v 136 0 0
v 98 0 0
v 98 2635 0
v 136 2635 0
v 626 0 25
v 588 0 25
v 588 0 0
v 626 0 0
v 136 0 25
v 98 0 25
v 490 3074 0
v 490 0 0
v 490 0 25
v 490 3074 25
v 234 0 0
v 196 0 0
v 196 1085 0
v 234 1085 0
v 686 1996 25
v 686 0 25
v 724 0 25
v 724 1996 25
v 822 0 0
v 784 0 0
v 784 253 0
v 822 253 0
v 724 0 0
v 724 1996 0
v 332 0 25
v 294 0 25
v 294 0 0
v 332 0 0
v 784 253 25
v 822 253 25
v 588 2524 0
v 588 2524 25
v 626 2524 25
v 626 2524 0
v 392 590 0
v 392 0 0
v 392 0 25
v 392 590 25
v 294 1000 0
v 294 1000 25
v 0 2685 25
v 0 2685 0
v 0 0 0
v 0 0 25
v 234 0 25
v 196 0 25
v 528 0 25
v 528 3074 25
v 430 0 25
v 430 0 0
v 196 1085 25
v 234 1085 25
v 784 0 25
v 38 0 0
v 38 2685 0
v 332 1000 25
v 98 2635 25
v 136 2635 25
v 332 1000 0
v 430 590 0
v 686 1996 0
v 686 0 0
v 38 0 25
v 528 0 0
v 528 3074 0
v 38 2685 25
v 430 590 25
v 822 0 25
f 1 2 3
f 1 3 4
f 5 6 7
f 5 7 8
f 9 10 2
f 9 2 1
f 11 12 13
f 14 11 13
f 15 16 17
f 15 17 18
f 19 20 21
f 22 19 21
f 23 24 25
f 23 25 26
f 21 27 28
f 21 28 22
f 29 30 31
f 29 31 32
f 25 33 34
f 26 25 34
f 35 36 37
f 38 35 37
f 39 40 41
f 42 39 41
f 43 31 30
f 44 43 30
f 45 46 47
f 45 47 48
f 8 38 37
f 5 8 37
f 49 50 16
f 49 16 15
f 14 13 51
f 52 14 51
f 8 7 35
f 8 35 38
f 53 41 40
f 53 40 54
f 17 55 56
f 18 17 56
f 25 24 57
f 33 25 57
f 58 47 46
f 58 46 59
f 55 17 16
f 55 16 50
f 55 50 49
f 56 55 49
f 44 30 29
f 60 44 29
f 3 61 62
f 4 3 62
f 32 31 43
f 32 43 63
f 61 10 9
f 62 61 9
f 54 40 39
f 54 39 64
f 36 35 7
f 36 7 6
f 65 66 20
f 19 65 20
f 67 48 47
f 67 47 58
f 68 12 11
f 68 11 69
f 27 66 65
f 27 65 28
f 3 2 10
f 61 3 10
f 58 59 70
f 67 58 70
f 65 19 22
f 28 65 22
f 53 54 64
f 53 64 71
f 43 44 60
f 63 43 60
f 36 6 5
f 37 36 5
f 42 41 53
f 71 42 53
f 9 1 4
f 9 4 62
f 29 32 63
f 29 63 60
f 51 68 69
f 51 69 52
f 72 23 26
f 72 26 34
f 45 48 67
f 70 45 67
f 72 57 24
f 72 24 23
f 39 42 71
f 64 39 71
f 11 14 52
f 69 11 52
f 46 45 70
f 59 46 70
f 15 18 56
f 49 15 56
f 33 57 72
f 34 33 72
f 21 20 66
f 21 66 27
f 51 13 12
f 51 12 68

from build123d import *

# Parameters (mm, degrees)
F0_W     = 38
F0_H     = 25
F1_DEPTH = 2685
F2_DEPTH = 2635
F3_DEPTH = 1085
F4_DEPTH = 1000
F5_DEPTH = 590
F6_DEPTH = 3074
F7_DEPTH = 2524
F8_DEPTH = 1996
F9_DEPTH = 253


with BuildPart() as f1:
    # F0 (on Front) → F1 (new body)
    with BuildSketch(Plane.XZ):
        with Locations((19, 12.5)):
            Rectangle(F0_W, F0_H)
    extrude(amount=-F1_DEPTH)


with BuildPart() as f2:
    # F0 (on Front) → F2 (new body)
    with BuildSketch(Plane.XZ):
        with Locations((117, 12.5)):
            Rectangle(F0_W, F0_H)
    extrude(amount=-F2_DEPTH)


with BuildPart() as f3:
    # F0 (on Front) → F3 (new body)
    with BuildSketch(Plane.XZ):
        with Locations((215, 12.5)):
            Rectangle(F0_W, F0_H)
    extrude(amount=-F3_DEPTH)


with BuildPart() as f4:
    # F0 (on Front) → F4 (new body)
    with BuildSketch(Plane.XZ):
        with Locations((313, 12.5)):
            Rectangle(F0_W, F0_H)
    extrude(amount=-F4_DEPTH)


with BuildPart() as f5:
    # F0 (on Front) → F5 (new body)
    with BuildSketch(Plane.XZ):
        with Locations((411, 12.5)):
            Rectangle(F0_W, F0_H)
    extrude(amount=-F5_DEPTH)


with BuildPart() as f6:
    # F0 (on Front) → F6 (new body)
    with BuildSketch(Plane.XZ):
        with Locations((509, 12.5)):
            Rectangle(F0_W, F0_H)
    extrude(amount=-F6_DEPTH)


with BuildPart() as f7:
    # F0 (on Front) → F7 (new body)
    with BuildSketch(Plane.XZ):
        with Locations((607, 12.5)):
            Rectangle(F0_W, F0_H)
    extrude(amount=-F7_DEPTH)


with BuildPart() as f8:
    # F0 (on Front) → F8 (new body)
    with BuildSketch(Plane.XZ):
        with Locations((705, 12.5)):
            Rectangle(F0_W, F0_H)
    extrude(amount=-F8_DEPTH)


with BuildPart() as f9:
    # F0 (on Front) → F9 (new body)
    with BuildSketch(Plane.XZ):
        with Locations((803, 12.5)):
            Rectangle(F0_W, F0_H)
    extrude(amount=-F9_DEPTH)


solid = Compound([f1.part, f2.part, f3.part, f4.part, f5.part, f6.part, f7.part, f8.part, f9.part])
